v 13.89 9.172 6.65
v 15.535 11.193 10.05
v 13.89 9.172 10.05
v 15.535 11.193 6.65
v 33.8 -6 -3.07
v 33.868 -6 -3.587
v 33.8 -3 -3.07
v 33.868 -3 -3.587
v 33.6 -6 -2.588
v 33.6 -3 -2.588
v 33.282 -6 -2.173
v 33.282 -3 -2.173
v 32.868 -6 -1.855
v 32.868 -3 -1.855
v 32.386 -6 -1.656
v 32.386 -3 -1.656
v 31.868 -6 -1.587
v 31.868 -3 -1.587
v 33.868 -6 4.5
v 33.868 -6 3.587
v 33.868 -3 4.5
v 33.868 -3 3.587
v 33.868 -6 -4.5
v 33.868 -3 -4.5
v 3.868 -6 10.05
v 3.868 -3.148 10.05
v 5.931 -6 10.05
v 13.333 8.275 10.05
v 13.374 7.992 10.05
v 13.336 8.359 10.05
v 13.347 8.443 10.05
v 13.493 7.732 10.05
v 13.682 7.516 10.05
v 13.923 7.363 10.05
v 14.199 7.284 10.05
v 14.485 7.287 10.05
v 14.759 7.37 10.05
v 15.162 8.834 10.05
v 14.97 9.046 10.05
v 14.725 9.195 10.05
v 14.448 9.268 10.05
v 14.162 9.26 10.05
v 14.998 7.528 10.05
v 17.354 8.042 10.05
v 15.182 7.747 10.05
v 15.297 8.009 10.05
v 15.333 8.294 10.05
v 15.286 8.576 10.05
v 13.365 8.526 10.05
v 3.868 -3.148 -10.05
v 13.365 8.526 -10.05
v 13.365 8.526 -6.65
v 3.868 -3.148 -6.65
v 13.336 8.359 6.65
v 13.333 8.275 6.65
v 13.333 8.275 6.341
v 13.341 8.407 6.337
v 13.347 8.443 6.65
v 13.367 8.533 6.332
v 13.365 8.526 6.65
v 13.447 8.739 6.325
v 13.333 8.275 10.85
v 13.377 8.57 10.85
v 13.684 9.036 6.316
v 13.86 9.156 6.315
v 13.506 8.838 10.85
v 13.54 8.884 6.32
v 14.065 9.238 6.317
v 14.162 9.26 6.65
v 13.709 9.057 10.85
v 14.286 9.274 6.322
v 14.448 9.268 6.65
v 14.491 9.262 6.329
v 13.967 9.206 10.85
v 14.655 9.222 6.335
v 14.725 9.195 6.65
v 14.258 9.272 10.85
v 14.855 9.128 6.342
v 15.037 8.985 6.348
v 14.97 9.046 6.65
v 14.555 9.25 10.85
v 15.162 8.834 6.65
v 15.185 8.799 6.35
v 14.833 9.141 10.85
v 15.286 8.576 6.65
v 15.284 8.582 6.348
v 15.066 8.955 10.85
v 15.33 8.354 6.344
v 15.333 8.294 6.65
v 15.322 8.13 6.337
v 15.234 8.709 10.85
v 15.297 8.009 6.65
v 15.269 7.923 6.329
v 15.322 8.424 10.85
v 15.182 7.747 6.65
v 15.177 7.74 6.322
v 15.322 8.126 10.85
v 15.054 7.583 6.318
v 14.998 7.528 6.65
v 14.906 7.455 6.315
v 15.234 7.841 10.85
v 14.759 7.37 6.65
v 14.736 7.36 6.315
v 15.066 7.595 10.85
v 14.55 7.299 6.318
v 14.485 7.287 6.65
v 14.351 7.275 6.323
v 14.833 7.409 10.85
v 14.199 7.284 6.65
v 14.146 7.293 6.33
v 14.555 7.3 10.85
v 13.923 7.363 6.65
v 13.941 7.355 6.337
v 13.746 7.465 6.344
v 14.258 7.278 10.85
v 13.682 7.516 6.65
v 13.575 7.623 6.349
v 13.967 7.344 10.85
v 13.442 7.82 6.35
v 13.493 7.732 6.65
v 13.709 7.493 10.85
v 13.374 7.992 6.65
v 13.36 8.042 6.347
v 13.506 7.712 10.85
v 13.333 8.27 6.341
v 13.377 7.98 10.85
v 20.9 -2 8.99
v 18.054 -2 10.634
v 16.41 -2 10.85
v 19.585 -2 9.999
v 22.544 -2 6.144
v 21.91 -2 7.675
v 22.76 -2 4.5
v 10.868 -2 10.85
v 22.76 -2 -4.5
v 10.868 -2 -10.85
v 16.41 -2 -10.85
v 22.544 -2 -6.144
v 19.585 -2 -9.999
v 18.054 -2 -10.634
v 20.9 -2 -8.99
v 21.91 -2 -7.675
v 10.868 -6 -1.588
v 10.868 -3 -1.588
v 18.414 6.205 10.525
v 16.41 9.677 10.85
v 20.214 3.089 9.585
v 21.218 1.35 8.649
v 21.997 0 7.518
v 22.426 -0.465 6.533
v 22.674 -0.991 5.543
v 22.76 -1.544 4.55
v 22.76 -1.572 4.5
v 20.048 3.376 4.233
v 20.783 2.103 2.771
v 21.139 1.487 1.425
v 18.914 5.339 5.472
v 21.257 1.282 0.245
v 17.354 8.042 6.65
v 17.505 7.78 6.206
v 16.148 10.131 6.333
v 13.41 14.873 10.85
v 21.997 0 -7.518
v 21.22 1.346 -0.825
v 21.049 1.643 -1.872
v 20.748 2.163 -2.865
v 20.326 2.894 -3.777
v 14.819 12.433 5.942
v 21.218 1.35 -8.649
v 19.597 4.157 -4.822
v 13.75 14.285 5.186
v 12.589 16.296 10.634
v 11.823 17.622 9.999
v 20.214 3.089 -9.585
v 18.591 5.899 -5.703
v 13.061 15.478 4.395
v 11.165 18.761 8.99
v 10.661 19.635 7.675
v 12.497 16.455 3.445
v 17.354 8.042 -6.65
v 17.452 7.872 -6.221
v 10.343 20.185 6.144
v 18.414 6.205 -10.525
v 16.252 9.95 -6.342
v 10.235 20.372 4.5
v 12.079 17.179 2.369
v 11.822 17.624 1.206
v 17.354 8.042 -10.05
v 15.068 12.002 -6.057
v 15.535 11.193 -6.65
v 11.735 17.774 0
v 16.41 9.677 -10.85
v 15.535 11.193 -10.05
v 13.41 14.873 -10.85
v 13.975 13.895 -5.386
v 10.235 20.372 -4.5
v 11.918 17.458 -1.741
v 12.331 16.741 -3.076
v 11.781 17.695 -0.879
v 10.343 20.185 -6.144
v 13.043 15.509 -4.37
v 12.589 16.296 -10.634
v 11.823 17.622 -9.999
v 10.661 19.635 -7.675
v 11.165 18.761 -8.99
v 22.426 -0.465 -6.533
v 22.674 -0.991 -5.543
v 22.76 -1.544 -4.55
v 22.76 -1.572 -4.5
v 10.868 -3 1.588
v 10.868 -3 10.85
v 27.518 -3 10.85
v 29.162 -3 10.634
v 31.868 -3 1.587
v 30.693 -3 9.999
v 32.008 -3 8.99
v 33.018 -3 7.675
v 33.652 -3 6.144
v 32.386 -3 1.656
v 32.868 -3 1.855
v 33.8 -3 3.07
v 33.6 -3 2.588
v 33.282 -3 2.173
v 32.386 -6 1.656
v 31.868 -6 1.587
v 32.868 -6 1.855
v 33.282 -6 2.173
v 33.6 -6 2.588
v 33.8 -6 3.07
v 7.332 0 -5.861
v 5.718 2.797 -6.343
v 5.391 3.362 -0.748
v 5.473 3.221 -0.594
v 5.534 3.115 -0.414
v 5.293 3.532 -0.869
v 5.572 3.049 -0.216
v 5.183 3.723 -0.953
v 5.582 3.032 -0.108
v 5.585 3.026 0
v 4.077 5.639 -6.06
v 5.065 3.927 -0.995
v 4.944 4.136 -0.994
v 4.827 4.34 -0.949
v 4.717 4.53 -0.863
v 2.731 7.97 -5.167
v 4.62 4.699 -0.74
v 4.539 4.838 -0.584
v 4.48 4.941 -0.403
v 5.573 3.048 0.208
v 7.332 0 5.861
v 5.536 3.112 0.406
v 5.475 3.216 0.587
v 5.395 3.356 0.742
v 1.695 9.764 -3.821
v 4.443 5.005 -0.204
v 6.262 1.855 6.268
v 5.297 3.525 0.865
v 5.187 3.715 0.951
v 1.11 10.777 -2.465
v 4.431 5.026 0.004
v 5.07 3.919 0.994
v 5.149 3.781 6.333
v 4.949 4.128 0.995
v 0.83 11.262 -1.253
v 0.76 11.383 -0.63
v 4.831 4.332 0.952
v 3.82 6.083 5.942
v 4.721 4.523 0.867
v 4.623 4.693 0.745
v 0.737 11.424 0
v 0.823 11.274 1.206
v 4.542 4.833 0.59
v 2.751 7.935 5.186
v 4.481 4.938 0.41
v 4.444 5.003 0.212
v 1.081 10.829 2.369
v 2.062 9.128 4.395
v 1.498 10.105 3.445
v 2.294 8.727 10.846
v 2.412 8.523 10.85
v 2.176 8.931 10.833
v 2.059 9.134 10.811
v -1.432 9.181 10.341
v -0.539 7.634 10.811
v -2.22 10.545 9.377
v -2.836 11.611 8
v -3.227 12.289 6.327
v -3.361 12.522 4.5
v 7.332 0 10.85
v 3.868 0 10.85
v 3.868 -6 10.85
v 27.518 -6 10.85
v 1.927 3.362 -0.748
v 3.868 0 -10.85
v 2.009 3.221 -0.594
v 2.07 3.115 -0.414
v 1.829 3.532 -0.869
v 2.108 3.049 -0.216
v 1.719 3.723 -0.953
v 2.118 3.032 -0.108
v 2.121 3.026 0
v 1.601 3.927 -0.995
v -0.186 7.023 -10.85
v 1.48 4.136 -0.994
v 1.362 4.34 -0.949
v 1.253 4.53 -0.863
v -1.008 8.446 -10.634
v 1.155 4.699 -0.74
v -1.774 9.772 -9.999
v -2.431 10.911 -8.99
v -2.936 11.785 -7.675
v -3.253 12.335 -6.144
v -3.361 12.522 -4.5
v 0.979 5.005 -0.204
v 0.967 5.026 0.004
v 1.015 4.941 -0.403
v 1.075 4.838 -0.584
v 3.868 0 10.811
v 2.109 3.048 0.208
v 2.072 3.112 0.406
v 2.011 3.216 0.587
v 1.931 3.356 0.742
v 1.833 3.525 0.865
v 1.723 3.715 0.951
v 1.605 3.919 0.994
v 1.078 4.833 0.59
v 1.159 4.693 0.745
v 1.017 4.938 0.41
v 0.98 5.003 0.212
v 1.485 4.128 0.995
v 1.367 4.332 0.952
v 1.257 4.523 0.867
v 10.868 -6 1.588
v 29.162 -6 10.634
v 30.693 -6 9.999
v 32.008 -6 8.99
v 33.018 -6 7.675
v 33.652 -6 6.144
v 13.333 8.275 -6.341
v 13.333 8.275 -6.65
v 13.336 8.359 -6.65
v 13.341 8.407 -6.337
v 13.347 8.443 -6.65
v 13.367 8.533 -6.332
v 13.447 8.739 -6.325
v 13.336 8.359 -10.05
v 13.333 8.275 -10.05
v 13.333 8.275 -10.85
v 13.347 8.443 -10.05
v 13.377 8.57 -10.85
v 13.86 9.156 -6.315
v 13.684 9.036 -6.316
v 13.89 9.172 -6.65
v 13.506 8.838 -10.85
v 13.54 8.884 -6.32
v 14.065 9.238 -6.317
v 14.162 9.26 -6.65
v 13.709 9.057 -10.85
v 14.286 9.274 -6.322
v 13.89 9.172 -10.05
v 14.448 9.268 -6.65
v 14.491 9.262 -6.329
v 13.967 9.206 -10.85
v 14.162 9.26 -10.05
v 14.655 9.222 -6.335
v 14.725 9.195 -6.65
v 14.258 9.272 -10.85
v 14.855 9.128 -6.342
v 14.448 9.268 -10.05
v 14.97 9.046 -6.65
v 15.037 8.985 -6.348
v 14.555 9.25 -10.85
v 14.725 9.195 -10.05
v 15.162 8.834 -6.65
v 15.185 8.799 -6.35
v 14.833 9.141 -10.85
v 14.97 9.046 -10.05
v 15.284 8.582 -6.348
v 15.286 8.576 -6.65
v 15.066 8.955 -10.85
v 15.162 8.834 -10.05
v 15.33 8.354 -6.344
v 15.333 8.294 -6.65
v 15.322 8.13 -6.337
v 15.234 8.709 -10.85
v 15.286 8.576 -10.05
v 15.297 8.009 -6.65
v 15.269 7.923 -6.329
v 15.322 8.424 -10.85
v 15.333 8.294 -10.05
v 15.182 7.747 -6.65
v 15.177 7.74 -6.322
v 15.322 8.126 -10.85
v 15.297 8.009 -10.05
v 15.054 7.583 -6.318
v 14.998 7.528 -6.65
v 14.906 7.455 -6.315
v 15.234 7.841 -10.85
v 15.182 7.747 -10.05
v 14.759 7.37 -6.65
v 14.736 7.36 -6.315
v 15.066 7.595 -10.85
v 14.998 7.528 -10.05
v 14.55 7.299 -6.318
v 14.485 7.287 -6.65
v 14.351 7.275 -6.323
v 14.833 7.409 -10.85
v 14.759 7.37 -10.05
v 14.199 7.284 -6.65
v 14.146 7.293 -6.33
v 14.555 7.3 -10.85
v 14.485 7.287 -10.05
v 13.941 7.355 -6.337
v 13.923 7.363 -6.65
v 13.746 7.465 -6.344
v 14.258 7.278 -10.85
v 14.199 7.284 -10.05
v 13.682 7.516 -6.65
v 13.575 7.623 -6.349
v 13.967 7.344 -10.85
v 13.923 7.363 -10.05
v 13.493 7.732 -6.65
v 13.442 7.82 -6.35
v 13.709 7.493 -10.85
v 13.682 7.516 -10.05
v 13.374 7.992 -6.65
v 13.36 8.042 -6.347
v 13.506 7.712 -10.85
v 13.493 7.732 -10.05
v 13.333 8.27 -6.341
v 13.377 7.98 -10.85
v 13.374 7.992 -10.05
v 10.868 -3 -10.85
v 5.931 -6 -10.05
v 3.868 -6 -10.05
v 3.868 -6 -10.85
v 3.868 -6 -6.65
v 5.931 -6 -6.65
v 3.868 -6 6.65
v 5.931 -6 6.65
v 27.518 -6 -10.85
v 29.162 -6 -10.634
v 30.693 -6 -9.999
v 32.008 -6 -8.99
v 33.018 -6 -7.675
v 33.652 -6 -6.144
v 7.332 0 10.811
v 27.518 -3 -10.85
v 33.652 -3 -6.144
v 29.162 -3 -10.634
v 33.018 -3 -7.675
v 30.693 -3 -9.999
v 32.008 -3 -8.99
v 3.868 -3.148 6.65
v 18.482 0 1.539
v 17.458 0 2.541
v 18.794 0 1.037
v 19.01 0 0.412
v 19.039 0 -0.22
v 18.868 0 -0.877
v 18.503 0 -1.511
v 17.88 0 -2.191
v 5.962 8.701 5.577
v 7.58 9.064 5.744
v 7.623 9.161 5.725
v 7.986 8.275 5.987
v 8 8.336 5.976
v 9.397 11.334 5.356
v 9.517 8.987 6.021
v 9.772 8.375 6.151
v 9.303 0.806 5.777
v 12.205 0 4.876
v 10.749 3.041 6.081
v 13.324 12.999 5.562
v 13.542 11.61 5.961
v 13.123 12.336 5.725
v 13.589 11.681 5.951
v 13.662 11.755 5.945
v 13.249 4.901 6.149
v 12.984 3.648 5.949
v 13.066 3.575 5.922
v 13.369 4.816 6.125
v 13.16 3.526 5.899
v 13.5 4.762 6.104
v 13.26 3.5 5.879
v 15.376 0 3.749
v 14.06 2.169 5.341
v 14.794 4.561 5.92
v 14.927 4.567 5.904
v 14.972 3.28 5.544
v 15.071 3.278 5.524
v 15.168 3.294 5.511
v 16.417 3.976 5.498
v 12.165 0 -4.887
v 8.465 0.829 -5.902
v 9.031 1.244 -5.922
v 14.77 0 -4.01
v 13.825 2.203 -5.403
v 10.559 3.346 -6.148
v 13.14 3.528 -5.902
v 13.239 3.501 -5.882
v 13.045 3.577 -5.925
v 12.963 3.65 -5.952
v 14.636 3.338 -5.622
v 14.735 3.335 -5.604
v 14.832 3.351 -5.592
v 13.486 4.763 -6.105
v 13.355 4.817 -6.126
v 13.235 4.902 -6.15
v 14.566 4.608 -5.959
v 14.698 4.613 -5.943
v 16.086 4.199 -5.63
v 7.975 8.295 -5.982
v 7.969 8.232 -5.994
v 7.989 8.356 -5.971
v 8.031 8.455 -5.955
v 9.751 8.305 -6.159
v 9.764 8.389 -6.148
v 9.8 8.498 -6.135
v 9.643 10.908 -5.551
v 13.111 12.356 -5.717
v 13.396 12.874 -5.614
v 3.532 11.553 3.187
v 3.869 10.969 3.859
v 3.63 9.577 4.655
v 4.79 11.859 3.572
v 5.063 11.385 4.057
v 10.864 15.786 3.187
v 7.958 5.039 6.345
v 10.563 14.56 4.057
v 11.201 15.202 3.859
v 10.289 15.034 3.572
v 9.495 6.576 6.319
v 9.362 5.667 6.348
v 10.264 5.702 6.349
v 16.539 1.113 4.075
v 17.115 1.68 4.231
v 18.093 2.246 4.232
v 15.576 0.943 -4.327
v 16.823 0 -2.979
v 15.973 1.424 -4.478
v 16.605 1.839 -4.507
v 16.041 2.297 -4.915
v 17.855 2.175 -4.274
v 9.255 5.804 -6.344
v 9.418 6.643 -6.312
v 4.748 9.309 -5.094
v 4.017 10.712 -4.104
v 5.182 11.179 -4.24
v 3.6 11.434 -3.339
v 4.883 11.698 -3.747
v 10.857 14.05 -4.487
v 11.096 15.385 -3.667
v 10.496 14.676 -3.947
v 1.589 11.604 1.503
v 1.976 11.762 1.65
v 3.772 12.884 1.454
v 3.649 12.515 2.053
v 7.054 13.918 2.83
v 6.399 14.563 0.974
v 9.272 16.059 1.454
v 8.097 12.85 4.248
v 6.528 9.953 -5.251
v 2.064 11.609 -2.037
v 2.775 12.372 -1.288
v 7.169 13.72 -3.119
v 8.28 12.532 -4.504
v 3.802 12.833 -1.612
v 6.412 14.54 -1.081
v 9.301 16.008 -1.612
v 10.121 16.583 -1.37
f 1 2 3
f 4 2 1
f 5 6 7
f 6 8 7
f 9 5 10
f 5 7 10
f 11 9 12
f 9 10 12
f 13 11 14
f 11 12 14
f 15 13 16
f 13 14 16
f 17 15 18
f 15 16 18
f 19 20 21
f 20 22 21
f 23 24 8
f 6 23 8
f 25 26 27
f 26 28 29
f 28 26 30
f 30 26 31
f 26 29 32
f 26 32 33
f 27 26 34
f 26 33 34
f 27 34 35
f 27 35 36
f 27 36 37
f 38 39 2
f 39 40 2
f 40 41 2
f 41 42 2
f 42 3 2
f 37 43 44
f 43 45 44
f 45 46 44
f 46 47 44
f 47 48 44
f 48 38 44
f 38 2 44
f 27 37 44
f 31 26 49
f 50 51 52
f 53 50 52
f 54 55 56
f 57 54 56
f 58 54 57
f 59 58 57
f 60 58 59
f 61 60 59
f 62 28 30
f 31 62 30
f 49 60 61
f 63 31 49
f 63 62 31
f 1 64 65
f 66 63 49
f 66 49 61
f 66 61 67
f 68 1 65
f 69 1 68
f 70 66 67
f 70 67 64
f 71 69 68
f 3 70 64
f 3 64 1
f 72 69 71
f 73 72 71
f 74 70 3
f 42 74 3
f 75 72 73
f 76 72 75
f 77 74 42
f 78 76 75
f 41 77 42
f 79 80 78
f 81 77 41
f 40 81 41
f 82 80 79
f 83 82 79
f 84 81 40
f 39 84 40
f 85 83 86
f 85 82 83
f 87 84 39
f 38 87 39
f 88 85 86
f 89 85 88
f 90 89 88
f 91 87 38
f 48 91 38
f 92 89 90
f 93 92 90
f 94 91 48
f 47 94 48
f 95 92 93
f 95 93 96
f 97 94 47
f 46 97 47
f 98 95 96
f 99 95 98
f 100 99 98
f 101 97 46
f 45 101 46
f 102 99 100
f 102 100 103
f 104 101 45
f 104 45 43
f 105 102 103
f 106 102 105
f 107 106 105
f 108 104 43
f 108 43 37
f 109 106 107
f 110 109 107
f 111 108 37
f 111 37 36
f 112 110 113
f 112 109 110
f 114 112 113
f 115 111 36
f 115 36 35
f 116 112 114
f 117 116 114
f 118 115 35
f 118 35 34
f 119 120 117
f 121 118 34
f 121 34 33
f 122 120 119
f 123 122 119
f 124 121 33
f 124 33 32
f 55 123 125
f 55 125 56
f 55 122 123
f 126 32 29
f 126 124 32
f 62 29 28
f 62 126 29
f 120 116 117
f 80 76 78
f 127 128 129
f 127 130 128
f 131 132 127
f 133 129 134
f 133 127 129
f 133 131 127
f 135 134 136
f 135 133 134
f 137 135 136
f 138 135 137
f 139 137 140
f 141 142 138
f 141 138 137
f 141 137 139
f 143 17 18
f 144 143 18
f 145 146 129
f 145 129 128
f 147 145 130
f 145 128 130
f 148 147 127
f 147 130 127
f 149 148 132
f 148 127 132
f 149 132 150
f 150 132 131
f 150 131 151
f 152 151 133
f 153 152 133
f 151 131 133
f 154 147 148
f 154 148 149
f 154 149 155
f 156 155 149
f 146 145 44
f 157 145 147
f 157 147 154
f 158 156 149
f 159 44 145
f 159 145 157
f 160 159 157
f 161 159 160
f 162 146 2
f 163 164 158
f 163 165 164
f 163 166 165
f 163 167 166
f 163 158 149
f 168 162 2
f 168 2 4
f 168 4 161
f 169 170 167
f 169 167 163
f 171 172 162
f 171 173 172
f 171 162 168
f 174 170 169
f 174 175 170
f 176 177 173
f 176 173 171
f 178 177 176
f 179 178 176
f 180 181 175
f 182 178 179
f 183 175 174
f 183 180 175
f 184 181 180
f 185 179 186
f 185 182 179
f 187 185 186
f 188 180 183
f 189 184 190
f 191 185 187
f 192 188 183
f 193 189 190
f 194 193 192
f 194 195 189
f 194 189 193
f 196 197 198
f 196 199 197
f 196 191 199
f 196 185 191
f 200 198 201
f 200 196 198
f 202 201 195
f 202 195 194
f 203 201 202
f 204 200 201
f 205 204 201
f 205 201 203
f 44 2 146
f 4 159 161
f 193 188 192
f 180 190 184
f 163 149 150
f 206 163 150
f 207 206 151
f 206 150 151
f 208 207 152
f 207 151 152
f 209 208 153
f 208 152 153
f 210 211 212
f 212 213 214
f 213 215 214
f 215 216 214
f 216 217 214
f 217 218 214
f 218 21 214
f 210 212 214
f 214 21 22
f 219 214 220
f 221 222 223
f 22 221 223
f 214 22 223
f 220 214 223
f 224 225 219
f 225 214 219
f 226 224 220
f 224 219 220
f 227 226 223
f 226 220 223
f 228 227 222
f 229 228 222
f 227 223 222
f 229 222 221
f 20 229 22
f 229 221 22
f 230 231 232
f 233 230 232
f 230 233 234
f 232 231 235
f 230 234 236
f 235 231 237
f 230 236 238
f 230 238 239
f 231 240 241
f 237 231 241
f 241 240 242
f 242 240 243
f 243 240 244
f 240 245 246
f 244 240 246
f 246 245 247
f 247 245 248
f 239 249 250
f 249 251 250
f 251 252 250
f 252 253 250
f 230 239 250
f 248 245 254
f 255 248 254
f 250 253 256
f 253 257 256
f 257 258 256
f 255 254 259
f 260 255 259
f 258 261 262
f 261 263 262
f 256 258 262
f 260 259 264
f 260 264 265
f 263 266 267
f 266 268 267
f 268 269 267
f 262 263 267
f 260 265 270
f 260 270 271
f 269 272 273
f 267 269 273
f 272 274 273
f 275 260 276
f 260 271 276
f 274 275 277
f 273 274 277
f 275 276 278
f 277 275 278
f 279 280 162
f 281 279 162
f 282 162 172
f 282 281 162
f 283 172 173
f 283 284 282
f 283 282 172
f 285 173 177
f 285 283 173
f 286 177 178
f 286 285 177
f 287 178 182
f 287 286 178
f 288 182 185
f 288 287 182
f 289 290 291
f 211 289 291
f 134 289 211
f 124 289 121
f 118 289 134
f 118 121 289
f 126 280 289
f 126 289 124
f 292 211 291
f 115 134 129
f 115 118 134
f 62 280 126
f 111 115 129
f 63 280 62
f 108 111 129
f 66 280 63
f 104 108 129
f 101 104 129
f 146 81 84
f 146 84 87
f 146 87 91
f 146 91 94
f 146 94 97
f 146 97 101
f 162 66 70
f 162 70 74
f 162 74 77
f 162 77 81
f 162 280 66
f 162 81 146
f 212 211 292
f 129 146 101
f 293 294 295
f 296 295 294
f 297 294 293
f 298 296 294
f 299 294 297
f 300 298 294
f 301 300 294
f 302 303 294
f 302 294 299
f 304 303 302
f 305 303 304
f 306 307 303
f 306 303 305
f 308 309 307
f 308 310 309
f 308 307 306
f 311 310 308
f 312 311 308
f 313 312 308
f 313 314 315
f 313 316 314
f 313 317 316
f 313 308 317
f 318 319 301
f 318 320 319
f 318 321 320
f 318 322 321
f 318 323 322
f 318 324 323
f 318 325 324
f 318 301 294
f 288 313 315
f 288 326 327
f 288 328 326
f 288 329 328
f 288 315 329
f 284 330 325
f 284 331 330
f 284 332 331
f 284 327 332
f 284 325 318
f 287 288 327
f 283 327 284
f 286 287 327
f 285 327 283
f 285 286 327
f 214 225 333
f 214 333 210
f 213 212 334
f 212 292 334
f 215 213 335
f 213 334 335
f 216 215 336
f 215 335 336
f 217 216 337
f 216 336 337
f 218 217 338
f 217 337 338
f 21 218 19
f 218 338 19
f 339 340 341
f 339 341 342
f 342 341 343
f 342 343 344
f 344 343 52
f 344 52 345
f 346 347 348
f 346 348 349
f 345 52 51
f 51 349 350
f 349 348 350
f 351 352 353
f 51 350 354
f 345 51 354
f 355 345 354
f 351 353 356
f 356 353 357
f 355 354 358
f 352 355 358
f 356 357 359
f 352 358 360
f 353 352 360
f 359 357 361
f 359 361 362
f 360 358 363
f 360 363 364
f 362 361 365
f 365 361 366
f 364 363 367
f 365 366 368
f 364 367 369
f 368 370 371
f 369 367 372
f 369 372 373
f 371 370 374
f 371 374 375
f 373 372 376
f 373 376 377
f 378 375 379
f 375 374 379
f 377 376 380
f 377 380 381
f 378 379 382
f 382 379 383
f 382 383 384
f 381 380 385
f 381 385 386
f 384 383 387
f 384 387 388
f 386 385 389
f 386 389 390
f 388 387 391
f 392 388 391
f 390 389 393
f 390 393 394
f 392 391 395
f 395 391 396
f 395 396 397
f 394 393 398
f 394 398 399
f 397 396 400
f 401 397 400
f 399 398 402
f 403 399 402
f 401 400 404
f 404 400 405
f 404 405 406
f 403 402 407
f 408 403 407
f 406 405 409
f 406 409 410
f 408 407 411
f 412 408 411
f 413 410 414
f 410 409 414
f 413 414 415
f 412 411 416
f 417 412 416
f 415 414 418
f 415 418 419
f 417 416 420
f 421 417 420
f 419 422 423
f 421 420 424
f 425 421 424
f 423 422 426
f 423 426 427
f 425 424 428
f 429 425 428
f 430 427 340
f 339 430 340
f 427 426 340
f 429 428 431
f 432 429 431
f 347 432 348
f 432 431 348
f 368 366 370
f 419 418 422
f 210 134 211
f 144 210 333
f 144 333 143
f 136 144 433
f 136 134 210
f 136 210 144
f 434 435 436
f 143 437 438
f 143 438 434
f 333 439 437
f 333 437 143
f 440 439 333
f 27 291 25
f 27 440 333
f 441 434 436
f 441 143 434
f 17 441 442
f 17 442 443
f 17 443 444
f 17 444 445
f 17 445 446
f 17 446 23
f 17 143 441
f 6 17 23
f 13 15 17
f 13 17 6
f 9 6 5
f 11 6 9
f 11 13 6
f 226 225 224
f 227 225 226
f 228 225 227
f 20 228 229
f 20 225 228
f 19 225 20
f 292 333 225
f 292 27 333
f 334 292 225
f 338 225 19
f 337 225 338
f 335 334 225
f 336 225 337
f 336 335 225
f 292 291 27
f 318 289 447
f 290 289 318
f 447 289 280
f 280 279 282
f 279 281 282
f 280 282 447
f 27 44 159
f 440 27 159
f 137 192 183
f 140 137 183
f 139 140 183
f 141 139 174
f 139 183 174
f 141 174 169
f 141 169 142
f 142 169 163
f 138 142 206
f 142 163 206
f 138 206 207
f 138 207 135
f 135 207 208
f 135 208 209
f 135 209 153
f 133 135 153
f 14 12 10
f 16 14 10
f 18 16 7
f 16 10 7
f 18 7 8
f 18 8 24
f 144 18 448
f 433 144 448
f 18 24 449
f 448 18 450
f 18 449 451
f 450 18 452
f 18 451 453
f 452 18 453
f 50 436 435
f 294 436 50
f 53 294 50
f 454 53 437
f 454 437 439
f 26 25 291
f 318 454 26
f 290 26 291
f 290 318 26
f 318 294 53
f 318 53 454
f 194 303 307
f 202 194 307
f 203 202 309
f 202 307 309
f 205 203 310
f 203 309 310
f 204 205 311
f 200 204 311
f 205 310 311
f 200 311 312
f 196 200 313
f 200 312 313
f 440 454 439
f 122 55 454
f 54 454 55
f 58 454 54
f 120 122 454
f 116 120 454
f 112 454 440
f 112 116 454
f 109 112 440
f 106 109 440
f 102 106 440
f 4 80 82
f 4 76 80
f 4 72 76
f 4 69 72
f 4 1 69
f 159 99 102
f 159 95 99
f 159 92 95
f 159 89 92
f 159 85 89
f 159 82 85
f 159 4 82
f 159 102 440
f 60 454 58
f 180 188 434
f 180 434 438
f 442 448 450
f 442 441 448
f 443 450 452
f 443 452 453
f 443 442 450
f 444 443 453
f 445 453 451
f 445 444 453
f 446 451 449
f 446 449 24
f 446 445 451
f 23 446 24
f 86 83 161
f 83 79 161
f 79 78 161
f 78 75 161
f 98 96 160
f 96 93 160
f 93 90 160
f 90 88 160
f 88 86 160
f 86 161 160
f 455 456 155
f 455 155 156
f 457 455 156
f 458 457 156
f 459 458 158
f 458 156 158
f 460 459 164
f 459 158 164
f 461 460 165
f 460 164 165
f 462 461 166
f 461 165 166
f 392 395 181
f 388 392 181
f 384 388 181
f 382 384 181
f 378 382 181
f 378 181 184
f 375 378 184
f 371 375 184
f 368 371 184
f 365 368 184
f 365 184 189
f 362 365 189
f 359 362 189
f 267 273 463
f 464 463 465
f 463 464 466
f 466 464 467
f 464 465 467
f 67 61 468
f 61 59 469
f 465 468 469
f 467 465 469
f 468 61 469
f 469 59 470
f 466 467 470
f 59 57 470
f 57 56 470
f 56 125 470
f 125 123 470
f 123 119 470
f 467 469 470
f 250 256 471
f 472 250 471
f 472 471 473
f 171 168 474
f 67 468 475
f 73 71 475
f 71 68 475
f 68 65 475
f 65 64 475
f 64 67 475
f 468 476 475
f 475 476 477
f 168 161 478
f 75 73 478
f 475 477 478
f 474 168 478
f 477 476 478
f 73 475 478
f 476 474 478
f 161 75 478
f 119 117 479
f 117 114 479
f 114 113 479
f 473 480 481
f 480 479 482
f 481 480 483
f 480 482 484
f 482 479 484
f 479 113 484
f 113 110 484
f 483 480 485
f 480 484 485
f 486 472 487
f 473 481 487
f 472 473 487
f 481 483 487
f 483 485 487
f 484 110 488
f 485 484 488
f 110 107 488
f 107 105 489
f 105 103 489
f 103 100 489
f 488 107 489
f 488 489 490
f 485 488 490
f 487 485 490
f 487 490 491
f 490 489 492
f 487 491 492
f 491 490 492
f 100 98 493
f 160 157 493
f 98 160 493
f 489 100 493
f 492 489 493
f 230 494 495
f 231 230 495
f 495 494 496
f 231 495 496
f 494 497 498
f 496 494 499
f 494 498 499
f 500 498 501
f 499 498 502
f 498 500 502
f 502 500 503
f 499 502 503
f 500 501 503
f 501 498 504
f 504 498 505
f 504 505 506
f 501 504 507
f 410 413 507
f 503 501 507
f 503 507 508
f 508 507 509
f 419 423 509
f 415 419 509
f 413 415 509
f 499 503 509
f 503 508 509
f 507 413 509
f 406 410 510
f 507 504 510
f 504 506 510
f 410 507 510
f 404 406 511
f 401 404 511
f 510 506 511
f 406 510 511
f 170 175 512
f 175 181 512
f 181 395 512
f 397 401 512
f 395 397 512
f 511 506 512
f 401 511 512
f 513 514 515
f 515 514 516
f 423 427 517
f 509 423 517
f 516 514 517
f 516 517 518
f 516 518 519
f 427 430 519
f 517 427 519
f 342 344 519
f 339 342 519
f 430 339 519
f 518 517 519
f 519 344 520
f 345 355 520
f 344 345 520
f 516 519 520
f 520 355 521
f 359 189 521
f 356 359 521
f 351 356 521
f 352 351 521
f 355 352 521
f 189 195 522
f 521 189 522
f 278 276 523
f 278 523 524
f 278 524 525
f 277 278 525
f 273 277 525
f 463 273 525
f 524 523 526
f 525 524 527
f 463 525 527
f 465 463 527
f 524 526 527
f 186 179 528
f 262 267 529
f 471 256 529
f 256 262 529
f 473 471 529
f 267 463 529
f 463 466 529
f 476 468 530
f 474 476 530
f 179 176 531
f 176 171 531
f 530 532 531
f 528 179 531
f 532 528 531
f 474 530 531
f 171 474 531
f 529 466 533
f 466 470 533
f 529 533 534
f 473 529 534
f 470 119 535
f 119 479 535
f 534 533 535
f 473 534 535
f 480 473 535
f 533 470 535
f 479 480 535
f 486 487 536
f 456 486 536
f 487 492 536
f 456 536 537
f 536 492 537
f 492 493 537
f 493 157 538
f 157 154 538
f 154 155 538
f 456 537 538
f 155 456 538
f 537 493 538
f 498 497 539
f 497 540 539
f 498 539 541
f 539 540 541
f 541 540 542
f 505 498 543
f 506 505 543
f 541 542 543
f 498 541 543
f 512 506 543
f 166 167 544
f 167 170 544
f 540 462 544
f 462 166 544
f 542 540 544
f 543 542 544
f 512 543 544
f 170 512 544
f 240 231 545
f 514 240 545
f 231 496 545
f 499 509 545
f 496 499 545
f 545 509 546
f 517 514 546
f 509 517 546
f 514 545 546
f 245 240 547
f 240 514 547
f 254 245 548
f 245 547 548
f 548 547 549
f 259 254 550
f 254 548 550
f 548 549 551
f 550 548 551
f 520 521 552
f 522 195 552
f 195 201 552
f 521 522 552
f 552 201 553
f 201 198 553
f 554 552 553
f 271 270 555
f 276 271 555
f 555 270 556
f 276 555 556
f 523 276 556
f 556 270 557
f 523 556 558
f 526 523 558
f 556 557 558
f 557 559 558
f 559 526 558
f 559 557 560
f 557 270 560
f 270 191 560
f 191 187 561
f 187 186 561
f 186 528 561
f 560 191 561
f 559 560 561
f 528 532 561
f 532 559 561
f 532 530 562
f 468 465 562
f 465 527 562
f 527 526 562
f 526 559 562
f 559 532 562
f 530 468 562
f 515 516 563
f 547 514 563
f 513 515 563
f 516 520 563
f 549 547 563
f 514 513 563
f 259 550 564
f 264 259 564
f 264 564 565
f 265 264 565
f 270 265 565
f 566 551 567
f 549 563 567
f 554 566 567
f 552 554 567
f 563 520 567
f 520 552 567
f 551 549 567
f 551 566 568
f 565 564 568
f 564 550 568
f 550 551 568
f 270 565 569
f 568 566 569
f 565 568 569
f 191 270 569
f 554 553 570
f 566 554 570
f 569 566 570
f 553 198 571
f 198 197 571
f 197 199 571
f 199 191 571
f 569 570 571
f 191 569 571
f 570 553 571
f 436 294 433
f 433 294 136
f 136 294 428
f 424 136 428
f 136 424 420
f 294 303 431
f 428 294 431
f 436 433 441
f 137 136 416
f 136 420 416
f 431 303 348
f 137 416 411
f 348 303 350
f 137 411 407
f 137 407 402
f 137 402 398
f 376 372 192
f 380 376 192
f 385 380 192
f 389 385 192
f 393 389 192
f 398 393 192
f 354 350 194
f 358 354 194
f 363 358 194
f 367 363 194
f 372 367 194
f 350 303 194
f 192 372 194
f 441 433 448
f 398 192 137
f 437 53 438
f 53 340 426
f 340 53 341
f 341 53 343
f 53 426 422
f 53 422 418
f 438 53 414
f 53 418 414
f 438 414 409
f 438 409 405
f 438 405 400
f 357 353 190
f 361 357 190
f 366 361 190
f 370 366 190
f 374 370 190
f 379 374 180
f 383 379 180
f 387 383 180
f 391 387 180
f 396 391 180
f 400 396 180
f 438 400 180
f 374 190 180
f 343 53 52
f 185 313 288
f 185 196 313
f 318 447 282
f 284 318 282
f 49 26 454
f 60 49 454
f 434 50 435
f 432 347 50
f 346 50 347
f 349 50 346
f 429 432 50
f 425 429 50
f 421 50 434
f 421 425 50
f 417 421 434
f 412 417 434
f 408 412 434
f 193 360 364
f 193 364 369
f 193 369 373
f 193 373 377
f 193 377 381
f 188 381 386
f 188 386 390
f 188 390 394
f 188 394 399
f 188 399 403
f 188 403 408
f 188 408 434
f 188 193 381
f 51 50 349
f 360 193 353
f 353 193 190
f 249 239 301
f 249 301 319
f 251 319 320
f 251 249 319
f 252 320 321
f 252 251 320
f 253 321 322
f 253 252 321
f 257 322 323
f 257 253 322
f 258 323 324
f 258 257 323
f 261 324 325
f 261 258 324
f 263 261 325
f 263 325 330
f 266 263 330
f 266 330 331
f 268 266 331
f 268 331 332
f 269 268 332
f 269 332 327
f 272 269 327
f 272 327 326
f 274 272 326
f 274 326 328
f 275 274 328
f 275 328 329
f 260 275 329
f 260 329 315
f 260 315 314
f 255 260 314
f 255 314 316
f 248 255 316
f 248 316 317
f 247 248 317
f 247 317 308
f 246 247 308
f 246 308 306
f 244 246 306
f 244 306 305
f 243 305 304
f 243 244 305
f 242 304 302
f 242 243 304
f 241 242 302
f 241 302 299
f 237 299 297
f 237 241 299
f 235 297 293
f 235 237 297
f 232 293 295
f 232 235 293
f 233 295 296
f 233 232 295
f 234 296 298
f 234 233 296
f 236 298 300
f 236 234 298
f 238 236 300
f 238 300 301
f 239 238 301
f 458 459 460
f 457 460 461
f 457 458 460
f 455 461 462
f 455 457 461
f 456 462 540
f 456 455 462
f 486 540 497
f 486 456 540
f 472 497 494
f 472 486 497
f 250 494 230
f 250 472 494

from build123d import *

# Parameters (mm, degrees)
SKETCH2_W           = 21.7
SKETCH2_H           = 25.05
SKETCH2_RX          = 9.525
SKETCH2_RY          = 6.35
BOSS_EXTRUDE1_DEPTH = 12.7
SKETCH3_W           = 21.660653916
SKETCH3_H           = 25.05
BOSS_EXTRUDE2_DEPTH = 3
SKETCH5_W           = 18.892037138
SKETCH5_H           = 21.7
BOSS_EXTRUDE3_DEPTH = 2
SKETCH6_W           = 30
SKETCH6_H           = 21.7
BOSS_EXTRUDE4_DEPTH = 4
SKETCH7_W           = 21.7
SKETCH7_H           = 1
SKETCH7_W_2         = 3.175
SKETCH7_H_2         = 3
CUT_EXTRUDE2_DEPTH  = 23
SKETCH7_3_W         = 21.7
SKETCH7_3_H         = 7.272473706
CUT_EXTRUDE3_DEPTH  = 44.803879418
SKETCH11_R          = 1
CUT_EXTRUDE8_DEPTH  = 33.487034031
CUT_EXTRUDE4_REACH  = 47.088
SKETCH9_R           = 1
SKETCH15_W          = 3.4
SKETCH15_H          = 3.4
CUT_EXTRUDE9_DEPTH  = 28.443249332
FILLET5_R           = 6.35
FILLET6_R           = 2
FILLET7_R           = 2


with BuildPart() as part:
    # Sketch2 → Boss-Extrude1 (new body)
    with BuildSketch(Plane(origin=(16.497783942, 9.525, 0), x_dir=(0, 0, -1), z_dir=(0.8660254037844379, 0.5000000000000013, 0))):
        Rectangle(SKETCH2_W, SKETCH2_H)
        with Locations(Location((0, 0), (0, 0, 90))):
            Ellipse(SKETCH2_RX, SKETCH2_RY, mode=Mode.SUBTRACT)
    extrude(amount=-BOSS_EXTRUDE1_DEPTH)

    # Sketch3 → Boss-Extrude2 (add)
    with BuildSketch(Plane(origin=(5.499261314, 3.175, 0), x_dir=(0, 0, 1), z_dir=(-0.8660254037844379, -0.5000000000000014, 0))):
        with Locations((-0.019673042, 0)):
            Rectangle(SKETCH3_W, SKETCH3_H)
    extrude(amount=BOSS_EXTRUDE2_DEPTH)

    # Sketch5 → Boss-Extrude3 (add)
    with BuildSketch(Plane(origin=(0, 0, 0), x_dir=(-1, 0, 0), z_dir=(0, 1, 0))):
        with Locations((-13.314265373, 0)):
            Rectangle(SKETCH5_W, SKETCH5_H)
    extrude(amount=-BOSS_EXTRUDE3_DEPTH)

    # Sketch6 → Boss-Extrude4 (add)
    with BuildSketch(Plane.XZ.offset(2)):
        with Locations((18.868246804, 0)):
            Rectangle(SKETCH6_W, SKETCH6_H)
    extrude(amount=BOSS_EXTRUDE4_DEPTH)

    # Sketch7 → Cut-Extrude2 (cut)
    with BuildSketch(Plane(origin=(33.868246804, 0, 0), x_dir=(0, 0, -1), z_dir=(1, 0, 0))):
        with Locations((0, -2.5)):
            Rectangle(SKETCH7_W, SKETCH7_H)
        with Locations((0, -4.5)):
            Rectangle(SKETCH7_W_2, SKETCH7_H_2)
    extrude(amount=-CUT_EXTRUDE2_DEPTH, mode=Mode.SUBTRACT)

    # Sketch7<3> → Cut-Extrude3 (cut, through all)
    with BuildSketch(Plane(origin=(33.868246804, 0, 0), x_dir=(0, 0, -1), z_dir=(1, 0, 0))):
        with Locations((0, -9.636236853)):
            Rectangle(SKETCH7_3_W, SKETCH7_3_H)
    extrude(amount=-CUT_EXTRUDE3_DEPTH, mode=Mode.SUBTRACT)

    # Sketch11 → Cut-Extrude8 (cut, through all)
    with BuildSketch(Plane(origin=(19.672783942, 0.194872981, 0), x_dir=(0, 0, -1), z_dir=(-1, 0, 0))):
        with Locations(Location((0, -3.830865705, 0), (0, 0, 90))):
            Circle(SKETCH11_R)
    extrude(amount=CUT_EXTRUDE8_DEPTH, mode=Mode.SUBTRACT)

    # Sketch9 → Cut-Extrude4 (cut, up to next)
    with BuildSketch(Plane(origin=(0, 0, -10.85), x_dir=(-1, 0, 0), z_dir=(0, 0, -1)), mode=Mode.PRIVATE) as cut_extrude4_sk1:
        with Locations((-14.332720433, 8.275)):
            Circle(SKETCH9_R)
    cut_extrude4_tool1 = extrude(cut_extrude4_sk1.sketch, amount=-CUT_EXTRUDE4_REACH, mode=Mode.PRIVATE) & part.part
    cut_extrude4 = cut_extrude4_tool1.solids().sort_by_distance((14.33272, 8.275, -10.85))[0]
    add(cut_extrude4, mode=Mode.SUBTRACT)

    # Sketch15 → Cut-Extrude9 (cut, symmetric)
    with BuildSketch(Plane(origin=(16.497783942, 9.525, 0), x_dir=(0.7757354378747654, -0.6310582623064579, 0), z_dir=(0.6310582623064579, 0.7757354378747654, 0))):
        with Locations((-0.1, -8.35)):
            Rectangle(SKETCH15_W, SKETCH15_H)
    cut_extrude9 = extrude(amount=CUT_EXTRUDE9_DEPTH, both=True, mode=Mode.SUBTRACT)

    # Mirror1: Cut-Extrude4, Cut-Extrude9 across plane
    add(cut_extrude4.mirror(Plane.XY), mode=Mode.SUBTRACT)
    add(cut_extrude9.mirror(Plane.XY), mode=Mode.SUBTRACT)

    # Fillet5
    fillet5_edges = [part.edges().sort_by_distance(p)[0] for p in [
        (33.868246804, -4.5, 10.85),
        (33.868246804, -4.5, -10.85),
        (22.760283942, -1, -10.85),
        (22.760283942, -1, 10.85),
        (4.736022628, 17.196968182, 10.85),
        (3.436984522, 16.446968182, -10.85),
    ]]
    fillet(fillet5_edges, radius=FILLET5_R)

    # Fillet6
    fillet6_edges = [part.edges().sort_by_distance(p)[0] for p in [
        (33.868246804, -4.5, 1.5875),
        (33.868246804, -4.5, -1.5875),
    ]]
    fillet(fillet6_edges, radius=FILLET6_R)

    # Fillet7
    # the kernel refuses this fillet: 2 mm, written as the material it takes off along each edge
    with BuildSketch(Plane(origin=(22.760283942, 0, 8.429393602), x_dir=(-1, 0, 0), z_dir=(0, 0, -1))) as fillet7_piece_1:
        with BuildLine():
            CenterArc((2, -1.571757441), FILLET7_R, 128.197977663, 51.802022337)
            Line((0, -1.571757441), (-0.04, -1.571757441))
            Line((-0.04, -1.571757441), (-0.04, 0))
            Line((-0.04, 0), (0, 0.04))
            ThreePointArc((0, 0.04), (0.381619343, 0.04), (0.73850346, 0.031435149))
            Line((0.73850346, 0.031435149), (0.763238686, 0))
        make_face()
    extrude(amount=16.858787203, mode=Mode.SUBTRACT)


solid = part.part
